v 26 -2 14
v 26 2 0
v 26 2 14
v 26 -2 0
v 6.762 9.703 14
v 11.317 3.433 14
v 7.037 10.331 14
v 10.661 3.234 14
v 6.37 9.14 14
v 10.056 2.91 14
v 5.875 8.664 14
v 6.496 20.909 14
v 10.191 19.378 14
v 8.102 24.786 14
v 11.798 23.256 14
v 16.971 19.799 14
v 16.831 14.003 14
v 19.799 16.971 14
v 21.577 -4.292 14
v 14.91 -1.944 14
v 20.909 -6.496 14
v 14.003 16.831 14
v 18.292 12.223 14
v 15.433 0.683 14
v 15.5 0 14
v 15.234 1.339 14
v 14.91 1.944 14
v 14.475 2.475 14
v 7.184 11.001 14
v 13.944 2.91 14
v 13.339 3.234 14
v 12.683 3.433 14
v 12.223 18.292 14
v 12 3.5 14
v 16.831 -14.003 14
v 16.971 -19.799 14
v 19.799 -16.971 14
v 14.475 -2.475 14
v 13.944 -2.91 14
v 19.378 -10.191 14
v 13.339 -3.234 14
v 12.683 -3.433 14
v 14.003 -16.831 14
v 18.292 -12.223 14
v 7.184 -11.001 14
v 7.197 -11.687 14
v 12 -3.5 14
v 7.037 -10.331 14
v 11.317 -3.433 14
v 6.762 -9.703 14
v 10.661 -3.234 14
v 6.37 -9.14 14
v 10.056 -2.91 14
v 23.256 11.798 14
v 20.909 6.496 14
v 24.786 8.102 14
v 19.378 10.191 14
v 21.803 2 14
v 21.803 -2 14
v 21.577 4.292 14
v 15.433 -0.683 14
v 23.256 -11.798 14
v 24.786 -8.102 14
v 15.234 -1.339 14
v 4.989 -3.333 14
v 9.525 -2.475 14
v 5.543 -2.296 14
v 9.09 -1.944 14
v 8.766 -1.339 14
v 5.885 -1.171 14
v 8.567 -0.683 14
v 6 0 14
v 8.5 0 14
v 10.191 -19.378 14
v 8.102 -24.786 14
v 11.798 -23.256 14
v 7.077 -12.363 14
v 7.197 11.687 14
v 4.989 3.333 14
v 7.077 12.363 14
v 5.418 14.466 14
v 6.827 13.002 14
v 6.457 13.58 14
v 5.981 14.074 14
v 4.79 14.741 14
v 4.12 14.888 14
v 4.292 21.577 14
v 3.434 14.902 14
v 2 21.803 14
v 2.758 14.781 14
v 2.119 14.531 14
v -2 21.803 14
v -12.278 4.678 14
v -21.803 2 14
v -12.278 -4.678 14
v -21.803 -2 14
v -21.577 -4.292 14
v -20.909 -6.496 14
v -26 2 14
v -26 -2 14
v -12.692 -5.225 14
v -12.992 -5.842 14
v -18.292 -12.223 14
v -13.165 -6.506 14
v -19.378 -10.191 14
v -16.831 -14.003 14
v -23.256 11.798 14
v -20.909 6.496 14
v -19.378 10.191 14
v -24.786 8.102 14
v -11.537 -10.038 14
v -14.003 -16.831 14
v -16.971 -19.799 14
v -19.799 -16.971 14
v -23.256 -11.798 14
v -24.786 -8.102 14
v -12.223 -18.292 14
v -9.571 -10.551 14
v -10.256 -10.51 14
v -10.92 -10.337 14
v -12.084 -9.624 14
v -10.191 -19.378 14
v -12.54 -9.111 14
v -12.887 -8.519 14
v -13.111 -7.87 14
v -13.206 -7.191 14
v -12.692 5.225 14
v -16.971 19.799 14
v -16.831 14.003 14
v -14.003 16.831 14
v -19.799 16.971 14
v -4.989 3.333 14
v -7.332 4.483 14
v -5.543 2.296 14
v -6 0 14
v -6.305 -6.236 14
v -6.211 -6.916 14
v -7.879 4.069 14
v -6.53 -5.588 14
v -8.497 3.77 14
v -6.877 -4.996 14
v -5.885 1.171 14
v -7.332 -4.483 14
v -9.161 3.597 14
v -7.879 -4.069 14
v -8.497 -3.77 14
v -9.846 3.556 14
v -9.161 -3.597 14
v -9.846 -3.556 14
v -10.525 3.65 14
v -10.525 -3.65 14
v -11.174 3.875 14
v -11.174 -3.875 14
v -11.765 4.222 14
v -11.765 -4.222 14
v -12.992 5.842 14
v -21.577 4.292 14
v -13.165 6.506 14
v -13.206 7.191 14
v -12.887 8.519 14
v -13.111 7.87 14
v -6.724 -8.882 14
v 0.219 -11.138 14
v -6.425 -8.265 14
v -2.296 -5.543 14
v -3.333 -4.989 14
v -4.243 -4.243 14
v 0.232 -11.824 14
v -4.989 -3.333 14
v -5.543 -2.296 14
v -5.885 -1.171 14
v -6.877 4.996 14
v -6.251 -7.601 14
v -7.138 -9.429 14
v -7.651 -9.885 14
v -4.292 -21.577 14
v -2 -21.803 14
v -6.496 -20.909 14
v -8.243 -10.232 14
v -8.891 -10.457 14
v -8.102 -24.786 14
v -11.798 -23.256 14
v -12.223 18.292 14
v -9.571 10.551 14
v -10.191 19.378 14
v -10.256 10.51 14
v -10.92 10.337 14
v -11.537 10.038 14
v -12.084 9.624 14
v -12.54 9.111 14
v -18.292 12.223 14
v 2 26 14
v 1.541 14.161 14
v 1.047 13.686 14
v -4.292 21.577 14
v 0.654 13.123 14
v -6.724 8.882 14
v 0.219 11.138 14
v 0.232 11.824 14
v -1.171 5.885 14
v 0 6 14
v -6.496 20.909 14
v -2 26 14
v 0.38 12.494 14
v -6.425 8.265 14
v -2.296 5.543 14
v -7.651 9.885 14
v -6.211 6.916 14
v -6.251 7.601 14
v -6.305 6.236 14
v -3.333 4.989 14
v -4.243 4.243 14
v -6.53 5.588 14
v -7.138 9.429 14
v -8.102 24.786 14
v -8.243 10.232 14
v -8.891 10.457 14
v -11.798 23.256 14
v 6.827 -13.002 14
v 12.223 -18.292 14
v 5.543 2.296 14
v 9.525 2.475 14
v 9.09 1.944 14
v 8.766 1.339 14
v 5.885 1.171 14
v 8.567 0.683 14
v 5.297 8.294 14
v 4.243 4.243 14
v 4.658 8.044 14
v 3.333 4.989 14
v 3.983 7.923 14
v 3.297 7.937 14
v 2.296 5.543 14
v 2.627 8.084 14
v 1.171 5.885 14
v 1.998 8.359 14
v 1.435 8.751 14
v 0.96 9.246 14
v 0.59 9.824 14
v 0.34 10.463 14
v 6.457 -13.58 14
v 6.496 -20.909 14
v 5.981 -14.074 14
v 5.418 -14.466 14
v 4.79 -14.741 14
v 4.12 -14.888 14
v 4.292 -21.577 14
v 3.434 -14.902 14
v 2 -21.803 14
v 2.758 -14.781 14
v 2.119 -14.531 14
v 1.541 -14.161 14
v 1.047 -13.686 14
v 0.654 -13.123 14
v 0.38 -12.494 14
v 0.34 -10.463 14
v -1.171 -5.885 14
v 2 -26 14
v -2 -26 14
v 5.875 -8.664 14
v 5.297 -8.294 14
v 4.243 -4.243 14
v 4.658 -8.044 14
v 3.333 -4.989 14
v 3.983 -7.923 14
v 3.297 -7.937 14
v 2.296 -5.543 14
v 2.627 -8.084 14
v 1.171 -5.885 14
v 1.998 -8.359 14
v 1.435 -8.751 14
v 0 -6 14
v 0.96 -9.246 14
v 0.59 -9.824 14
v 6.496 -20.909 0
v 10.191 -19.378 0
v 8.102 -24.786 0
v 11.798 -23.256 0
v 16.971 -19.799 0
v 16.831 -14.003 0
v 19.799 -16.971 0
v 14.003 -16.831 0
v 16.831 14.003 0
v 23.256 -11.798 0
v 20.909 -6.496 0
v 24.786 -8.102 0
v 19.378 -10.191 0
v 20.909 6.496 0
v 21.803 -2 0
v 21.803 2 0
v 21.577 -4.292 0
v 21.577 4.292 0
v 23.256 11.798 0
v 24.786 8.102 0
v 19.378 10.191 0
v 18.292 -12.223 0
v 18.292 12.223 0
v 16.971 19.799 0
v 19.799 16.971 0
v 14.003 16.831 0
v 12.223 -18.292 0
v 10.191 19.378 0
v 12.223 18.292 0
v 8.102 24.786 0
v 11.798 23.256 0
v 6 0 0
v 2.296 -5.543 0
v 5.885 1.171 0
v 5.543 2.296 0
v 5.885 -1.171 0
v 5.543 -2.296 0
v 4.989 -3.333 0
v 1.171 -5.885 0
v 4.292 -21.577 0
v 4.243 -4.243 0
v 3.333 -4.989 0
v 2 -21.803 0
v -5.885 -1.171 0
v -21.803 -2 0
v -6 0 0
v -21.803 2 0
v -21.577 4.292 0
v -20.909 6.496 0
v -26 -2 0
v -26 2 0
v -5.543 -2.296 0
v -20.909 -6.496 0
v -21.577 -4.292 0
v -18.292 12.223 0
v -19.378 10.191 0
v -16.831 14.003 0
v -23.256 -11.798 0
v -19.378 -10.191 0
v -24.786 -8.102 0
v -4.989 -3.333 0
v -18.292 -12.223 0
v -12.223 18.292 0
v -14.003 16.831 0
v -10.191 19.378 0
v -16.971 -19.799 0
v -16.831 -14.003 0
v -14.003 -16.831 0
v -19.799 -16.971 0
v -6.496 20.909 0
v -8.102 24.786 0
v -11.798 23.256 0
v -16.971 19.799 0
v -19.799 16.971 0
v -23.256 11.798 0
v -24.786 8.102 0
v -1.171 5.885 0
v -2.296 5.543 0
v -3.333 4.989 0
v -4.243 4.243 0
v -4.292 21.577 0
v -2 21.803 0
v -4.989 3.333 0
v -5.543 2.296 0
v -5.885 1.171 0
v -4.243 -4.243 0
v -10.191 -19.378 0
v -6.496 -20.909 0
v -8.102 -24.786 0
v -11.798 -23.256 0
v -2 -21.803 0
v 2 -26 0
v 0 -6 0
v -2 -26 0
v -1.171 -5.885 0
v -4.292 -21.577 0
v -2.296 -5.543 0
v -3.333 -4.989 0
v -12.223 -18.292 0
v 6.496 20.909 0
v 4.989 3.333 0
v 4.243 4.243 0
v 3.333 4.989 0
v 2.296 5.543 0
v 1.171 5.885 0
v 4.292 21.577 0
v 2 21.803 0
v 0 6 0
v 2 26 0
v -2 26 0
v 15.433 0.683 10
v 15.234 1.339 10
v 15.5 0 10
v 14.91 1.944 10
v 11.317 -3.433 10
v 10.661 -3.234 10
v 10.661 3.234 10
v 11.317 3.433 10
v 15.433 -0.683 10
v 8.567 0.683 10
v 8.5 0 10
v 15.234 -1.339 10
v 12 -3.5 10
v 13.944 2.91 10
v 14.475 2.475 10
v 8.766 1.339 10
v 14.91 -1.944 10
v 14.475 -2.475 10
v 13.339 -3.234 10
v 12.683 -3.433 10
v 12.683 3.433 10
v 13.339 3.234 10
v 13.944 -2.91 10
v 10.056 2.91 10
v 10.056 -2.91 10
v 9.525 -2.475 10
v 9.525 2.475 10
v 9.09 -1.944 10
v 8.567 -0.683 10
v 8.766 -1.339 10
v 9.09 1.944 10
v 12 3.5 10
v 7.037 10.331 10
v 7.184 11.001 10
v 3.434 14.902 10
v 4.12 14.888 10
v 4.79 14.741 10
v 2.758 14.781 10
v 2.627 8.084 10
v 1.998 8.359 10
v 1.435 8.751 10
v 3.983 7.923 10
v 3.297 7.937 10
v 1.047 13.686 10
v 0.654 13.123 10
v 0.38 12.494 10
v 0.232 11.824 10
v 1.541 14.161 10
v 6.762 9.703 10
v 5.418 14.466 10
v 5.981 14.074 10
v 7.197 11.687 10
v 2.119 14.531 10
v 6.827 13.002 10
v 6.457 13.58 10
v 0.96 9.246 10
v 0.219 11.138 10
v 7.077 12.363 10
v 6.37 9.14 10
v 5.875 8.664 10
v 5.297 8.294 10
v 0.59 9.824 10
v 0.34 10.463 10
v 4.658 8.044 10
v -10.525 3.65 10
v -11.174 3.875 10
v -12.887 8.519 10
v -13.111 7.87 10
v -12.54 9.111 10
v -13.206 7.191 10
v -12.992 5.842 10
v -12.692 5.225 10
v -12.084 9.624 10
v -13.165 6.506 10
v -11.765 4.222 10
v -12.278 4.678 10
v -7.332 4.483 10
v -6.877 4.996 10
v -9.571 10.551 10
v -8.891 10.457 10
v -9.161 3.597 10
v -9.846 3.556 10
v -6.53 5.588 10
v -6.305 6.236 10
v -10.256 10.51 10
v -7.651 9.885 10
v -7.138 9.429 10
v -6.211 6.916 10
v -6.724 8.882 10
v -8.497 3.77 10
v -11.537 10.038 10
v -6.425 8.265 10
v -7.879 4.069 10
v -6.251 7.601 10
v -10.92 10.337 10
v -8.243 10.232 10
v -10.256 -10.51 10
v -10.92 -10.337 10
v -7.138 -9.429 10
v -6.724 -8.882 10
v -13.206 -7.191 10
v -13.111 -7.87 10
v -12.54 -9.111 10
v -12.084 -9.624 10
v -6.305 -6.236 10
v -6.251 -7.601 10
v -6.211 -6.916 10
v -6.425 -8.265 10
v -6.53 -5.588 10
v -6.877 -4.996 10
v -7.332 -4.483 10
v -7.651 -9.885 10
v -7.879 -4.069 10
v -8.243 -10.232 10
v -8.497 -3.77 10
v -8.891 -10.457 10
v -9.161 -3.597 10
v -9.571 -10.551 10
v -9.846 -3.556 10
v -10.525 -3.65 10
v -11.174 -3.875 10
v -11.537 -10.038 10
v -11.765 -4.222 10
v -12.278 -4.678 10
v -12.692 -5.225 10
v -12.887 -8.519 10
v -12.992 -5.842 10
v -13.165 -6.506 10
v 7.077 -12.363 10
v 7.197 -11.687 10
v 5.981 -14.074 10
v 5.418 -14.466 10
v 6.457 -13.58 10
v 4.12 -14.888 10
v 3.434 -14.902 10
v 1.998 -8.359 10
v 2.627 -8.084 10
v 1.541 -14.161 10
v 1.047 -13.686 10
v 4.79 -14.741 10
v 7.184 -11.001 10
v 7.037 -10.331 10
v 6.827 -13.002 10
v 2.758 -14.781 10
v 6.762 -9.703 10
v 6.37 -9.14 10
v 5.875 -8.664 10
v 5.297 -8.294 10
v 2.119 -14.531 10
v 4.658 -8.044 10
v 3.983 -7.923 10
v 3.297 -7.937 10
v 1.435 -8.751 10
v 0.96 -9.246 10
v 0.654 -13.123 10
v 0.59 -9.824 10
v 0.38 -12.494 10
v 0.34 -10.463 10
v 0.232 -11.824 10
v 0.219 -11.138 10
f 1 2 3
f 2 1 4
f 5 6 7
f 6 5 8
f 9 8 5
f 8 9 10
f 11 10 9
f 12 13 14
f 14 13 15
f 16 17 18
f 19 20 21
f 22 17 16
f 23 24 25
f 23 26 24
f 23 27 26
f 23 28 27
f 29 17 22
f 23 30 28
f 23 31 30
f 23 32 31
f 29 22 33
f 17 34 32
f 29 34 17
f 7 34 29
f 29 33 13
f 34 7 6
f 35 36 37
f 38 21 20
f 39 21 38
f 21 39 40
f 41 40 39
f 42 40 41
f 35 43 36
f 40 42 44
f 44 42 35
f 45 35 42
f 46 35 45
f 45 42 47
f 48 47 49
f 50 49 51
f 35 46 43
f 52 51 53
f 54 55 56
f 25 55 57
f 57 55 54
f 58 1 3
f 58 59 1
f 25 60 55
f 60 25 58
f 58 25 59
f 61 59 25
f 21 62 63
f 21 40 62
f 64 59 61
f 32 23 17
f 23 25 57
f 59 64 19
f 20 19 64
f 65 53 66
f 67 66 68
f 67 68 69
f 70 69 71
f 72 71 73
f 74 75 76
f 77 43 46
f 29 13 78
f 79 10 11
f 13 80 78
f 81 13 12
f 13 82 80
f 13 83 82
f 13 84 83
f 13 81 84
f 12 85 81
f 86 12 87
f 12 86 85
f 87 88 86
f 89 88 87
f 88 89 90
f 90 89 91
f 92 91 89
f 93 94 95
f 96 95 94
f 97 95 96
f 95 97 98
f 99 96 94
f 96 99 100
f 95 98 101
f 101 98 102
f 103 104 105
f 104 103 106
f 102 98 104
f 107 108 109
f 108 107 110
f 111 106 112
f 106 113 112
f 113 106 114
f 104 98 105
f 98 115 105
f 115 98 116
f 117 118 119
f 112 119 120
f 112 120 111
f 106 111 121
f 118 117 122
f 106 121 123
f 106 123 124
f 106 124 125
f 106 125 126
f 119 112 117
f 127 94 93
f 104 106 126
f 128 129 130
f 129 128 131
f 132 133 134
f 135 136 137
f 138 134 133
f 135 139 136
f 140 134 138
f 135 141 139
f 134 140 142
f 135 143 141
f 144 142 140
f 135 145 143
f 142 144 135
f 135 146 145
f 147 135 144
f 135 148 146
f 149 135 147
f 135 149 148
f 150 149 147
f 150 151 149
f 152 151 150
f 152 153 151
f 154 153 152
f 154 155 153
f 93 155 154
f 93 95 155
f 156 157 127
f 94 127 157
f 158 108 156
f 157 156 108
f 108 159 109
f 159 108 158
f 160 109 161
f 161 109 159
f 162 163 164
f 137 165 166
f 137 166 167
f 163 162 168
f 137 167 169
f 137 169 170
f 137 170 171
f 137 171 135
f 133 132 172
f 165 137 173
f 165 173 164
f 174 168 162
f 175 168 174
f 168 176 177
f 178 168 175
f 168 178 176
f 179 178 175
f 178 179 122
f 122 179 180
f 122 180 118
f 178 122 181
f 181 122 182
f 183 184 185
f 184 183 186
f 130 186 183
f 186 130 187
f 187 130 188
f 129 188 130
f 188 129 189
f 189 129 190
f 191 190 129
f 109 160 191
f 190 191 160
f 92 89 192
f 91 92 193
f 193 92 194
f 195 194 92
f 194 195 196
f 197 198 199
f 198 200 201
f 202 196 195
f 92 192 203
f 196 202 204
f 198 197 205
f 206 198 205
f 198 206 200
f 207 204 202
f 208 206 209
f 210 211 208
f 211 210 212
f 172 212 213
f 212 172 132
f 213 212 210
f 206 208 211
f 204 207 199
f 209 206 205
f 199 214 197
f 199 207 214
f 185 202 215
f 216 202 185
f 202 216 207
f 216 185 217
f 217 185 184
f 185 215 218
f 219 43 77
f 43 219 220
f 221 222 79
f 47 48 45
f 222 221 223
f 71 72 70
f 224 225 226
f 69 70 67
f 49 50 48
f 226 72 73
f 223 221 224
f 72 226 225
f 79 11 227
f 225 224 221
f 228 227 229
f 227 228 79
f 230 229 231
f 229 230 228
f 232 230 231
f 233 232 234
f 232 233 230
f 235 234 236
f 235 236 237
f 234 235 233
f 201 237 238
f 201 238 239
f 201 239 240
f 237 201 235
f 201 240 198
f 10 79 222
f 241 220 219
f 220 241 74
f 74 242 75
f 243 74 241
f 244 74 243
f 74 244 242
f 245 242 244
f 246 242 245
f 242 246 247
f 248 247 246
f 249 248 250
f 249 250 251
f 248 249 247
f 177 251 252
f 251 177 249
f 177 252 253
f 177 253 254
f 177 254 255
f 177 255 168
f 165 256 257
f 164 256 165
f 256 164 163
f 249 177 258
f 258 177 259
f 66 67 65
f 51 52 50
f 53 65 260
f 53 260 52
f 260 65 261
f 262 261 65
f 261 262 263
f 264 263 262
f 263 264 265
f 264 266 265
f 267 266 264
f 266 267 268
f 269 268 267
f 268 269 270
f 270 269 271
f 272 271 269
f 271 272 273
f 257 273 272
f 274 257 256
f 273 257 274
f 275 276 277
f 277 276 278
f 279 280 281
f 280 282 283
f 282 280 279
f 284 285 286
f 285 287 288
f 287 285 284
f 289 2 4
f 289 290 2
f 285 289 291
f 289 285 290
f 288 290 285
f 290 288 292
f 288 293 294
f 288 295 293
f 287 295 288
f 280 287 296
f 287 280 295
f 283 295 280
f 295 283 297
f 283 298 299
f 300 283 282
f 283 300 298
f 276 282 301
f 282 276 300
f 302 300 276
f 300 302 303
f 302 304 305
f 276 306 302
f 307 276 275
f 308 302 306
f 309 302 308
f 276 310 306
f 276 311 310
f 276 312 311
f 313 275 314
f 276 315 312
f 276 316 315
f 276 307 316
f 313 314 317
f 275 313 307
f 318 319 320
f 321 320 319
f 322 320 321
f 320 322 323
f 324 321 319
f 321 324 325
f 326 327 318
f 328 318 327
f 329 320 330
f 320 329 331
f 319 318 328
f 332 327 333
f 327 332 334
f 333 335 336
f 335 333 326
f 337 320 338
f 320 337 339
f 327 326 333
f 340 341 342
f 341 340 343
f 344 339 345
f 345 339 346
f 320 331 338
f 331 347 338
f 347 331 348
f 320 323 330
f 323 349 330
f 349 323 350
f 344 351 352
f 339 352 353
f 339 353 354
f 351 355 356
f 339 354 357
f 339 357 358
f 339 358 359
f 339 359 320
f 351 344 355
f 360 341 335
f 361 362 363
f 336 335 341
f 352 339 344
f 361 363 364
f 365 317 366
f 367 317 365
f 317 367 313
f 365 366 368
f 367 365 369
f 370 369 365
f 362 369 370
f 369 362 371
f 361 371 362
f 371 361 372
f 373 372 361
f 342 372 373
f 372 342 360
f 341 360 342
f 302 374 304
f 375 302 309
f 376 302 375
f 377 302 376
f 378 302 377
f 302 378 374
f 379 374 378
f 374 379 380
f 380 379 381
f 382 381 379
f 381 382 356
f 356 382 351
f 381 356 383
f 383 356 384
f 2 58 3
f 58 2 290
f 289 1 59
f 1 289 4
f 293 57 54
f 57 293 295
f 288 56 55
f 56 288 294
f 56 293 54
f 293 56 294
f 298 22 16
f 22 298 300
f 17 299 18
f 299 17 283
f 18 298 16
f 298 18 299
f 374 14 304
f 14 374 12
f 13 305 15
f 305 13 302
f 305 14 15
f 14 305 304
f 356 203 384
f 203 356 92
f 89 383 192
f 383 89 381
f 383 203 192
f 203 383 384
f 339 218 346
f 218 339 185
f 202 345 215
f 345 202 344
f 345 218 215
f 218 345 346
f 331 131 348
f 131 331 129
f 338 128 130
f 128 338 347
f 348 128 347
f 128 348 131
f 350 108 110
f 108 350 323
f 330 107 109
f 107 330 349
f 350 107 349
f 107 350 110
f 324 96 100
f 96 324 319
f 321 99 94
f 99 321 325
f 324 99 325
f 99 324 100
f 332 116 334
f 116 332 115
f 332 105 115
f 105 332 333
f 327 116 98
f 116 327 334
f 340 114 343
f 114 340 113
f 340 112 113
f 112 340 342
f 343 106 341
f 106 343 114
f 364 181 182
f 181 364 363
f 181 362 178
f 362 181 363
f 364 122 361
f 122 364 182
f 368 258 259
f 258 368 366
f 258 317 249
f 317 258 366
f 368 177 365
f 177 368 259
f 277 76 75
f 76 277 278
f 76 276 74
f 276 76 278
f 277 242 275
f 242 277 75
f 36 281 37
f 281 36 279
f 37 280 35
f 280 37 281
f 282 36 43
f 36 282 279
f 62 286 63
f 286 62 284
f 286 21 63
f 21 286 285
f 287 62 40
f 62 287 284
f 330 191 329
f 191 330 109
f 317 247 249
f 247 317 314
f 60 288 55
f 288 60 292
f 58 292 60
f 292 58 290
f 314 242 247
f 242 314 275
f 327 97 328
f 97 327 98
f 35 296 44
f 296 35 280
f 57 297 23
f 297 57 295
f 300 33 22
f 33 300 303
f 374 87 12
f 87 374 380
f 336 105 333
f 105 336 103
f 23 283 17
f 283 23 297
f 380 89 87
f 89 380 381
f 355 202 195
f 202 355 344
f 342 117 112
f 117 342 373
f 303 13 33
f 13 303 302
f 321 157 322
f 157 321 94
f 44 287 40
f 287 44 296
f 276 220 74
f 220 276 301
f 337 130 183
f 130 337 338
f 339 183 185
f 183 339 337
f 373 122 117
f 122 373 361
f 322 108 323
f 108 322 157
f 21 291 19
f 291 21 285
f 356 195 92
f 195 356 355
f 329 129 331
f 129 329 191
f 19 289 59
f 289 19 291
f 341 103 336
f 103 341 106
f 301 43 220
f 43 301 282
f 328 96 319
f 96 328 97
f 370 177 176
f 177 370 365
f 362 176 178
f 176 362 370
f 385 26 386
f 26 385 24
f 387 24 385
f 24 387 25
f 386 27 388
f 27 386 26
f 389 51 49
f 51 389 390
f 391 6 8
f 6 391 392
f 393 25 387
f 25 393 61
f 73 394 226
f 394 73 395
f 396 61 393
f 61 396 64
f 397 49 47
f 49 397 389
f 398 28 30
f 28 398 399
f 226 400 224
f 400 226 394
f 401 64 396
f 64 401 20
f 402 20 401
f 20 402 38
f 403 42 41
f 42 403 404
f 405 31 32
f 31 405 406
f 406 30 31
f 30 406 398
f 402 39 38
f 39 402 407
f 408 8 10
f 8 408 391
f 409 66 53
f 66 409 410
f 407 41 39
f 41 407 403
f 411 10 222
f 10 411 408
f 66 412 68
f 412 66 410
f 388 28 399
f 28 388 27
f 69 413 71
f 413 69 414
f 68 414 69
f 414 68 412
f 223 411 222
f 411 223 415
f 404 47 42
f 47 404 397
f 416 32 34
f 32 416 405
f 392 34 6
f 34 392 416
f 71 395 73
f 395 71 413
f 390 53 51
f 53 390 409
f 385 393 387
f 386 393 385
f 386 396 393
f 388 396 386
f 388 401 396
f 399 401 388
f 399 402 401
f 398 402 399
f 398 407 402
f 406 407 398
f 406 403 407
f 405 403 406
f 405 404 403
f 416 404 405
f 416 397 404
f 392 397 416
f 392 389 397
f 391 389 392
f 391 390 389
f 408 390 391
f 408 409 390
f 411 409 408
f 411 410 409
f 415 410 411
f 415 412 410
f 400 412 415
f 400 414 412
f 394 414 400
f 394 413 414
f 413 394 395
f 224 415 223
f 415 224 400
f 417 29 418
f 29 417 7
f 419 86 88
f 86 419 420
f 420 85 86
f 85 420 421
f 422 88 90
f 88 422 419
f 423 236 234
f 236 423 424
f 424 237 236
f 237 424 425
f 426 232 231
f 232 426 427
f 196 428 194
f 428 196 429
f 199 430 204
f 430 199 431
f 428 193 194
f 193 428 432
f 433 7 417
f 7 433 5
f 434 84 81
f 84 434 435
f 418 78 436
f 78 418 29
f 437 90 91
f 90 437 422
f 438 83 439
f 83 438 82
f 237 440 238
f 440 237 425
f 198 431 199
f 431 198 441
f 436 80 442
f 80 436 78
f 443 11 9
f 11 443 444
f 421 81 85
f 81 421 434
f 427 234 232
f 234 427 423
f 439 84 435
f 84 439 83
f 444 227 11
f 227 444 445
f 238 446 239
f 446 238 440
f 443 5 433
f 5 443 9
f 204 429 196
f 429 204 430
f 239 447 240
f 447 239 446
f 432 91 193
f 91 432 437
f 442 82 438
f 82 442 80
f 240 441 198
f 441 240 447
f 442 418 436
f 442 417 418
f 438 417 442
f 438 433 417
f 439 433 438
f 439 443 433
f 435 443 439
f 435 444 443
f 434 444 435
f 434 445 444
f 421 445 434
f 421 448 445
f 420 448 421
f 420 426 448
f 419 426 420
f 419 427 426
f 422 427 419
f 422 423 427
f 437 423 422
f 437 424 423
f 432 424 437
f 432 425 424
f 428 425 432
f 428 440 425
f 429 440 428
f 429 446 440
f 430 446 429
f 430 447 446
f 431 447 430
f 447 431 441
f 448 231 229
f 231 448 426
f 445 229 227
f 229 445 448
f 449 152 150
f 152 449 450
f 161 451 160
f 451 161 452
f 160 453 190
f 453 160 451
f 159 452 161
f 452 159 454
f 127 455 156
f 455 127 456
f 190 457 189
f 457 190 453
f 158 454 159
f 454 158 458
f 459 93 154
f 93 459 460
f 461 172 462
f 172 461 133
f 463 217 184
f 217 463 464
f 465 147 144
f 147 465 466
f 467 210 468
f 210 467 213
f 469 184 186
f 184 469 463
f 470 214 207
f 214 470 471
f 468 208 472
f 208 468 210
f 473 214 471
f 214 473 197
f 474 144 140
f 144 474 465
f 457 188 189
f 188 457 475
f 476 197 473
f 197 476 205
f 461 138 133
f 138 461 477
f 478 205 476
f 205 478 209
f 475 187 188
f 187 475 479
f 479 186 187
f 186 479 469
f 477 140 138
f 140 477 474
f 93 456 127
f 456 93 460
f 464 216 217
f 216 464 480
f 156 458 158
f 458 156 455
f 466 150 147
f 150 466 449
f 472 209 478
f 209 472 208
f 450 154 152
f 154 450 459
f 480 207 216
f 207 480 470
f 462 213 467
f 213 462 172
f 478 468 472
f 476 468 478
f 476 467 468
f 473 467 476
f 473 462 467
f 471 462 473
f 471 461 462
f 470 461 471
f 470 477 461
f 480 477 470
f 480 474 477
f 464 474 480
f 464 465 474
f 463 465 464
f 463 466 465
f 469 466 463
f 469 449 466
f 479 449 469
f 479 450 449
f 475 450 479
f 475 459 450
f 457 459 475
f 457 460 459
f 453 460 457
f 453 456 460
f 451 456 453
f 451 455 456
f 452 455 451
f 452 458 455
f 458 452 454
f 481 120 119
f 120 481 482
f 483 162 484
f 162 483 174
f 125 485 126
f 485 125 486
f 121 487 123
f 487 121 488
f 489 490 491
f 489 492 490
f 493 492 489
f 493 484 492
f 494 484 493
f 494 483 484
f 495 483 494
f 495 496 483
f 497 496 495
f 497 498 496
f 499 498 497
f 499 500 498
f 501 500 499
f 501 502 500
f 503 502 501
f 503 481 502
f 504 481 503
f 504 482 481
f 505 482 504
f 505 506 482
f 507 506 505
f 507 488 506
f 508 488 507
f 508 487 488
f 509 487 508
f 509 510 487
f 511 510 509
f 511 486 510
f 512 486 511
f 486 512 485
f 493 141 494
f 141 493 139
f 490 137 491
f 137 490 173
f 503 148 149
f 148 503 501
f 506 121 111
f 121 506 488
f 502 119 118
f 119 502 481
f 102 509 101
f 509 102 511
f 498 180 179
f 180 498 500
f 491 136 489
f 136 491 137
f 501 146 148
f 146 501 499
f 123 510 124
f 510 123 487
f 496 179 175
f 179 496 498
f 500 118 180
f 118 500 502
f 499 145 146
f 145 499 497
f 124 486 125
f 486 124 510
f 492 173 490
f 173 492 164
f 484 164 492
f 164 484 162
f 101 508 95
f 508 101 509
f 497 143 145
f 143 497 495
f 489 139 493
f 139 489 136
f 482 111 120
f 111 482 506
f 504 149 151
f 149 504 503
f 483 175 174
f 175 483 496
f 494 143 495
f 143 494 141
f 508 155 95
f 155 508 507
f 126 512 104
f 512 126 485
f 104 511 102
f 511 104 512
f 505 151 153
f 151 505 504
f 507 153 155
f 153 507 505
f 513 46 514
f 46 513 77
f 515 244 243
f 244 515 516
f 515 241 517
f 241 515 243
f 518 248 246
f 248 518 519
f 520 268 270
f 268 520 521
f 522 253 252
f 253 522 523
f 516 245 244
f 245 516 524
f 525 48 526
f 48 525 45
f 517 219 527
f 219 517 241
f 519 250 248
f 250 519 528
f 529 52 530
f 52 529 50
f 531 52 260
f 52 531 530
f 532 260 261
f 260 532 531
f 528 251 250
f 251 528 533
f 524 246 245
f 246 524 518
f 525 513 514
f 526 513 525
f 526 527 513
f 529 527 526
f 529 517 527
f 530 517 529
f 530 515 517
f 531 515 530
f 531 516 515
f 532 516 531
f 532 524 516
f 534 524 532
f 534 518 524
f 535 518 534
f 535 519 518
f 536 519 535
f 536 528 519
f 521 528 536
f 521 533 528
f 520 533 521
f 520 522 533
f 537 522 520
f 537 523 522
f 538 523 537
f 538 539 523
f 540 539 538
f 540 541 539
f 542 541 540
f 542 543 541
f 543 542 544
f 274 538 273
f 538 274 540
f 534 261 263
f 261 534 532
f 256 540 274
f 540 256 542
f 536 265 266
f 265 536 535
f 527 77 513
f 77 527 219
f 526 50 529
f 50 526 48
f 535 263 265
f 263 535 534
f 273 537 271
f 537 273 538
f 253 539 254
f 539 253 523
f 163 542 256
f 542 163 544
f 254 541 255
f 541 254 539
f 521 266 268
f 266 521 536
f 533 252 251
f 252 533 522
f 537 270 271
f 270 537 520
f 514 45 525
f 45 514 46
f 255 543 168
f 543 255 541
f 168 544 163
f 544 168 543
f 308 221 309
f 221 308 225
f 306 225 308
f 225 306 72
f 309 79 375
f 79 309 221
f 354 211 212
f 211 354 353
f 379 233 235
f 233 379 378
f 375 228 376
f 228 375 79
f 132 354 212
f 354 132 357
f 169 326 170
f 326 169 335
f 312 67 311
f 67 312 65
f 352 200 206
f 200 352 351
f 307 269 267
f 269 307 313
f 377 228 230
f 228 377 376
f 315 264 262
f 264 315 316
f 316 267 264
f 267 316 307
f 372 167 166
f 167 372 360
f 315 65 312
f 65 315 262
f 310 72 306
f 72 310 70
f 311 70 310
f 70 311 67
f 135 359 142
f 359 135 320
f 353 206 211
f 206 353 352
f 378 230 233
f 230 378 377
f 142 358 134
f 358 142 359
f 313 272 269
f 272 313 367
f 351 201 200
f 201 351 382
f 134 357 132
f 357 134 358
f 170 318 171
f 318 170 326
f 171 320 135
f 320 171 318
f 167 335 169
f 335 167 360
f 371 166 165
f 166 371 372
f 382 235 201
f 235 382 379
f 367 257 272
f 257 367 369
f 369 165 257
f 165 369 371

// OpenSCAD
$fn = 32;

// ----------------------------------------------------------------------
// Spur blank: lightened gear blank
// ----------------------------------------------------------------------

// --- parameters (mm) ---
disc_r = 22;              // blank root radius
disc_t = 14;              // blank thickness
n_teeth = 16;             // stub tooth count
tooth_w = 4;              // tooth width at the root
tooth_h = 4;              // tooth height above the root
bore_r = 6;               // central bore radius
ring_r = 12;              // lightening pocket ring radius
pocket_r = 3.5;           // lightening pocket radius

out_r = disc_r + tooth_h;  // tip radius
bbox_x = 52.0;  // measured width over the teeth
bbox_y = 52.0;  // measured depth over the teeth

difference() {
union() {
  cylinder(r = disc_r, h = disc_t);
  for (i = [0 : n_teeth - 1])
    rotate([0, 0, i * 360 / n_teeth])
      translate([disc_r - 1, -tooth_w / 2, 0])
        cube([tooth_h + 1, tooth_w, disc_t]);
}
  translate([0, 0, -1]) cylinder(r = bore_r, h = disc_t + 2);
  for (i = [0 : 5])
    rotate([0, 0, i * 72])
      translate([ring_r, 0, disc_t - 4])
        cylinder(r = pocket_r, h = 5);
}
